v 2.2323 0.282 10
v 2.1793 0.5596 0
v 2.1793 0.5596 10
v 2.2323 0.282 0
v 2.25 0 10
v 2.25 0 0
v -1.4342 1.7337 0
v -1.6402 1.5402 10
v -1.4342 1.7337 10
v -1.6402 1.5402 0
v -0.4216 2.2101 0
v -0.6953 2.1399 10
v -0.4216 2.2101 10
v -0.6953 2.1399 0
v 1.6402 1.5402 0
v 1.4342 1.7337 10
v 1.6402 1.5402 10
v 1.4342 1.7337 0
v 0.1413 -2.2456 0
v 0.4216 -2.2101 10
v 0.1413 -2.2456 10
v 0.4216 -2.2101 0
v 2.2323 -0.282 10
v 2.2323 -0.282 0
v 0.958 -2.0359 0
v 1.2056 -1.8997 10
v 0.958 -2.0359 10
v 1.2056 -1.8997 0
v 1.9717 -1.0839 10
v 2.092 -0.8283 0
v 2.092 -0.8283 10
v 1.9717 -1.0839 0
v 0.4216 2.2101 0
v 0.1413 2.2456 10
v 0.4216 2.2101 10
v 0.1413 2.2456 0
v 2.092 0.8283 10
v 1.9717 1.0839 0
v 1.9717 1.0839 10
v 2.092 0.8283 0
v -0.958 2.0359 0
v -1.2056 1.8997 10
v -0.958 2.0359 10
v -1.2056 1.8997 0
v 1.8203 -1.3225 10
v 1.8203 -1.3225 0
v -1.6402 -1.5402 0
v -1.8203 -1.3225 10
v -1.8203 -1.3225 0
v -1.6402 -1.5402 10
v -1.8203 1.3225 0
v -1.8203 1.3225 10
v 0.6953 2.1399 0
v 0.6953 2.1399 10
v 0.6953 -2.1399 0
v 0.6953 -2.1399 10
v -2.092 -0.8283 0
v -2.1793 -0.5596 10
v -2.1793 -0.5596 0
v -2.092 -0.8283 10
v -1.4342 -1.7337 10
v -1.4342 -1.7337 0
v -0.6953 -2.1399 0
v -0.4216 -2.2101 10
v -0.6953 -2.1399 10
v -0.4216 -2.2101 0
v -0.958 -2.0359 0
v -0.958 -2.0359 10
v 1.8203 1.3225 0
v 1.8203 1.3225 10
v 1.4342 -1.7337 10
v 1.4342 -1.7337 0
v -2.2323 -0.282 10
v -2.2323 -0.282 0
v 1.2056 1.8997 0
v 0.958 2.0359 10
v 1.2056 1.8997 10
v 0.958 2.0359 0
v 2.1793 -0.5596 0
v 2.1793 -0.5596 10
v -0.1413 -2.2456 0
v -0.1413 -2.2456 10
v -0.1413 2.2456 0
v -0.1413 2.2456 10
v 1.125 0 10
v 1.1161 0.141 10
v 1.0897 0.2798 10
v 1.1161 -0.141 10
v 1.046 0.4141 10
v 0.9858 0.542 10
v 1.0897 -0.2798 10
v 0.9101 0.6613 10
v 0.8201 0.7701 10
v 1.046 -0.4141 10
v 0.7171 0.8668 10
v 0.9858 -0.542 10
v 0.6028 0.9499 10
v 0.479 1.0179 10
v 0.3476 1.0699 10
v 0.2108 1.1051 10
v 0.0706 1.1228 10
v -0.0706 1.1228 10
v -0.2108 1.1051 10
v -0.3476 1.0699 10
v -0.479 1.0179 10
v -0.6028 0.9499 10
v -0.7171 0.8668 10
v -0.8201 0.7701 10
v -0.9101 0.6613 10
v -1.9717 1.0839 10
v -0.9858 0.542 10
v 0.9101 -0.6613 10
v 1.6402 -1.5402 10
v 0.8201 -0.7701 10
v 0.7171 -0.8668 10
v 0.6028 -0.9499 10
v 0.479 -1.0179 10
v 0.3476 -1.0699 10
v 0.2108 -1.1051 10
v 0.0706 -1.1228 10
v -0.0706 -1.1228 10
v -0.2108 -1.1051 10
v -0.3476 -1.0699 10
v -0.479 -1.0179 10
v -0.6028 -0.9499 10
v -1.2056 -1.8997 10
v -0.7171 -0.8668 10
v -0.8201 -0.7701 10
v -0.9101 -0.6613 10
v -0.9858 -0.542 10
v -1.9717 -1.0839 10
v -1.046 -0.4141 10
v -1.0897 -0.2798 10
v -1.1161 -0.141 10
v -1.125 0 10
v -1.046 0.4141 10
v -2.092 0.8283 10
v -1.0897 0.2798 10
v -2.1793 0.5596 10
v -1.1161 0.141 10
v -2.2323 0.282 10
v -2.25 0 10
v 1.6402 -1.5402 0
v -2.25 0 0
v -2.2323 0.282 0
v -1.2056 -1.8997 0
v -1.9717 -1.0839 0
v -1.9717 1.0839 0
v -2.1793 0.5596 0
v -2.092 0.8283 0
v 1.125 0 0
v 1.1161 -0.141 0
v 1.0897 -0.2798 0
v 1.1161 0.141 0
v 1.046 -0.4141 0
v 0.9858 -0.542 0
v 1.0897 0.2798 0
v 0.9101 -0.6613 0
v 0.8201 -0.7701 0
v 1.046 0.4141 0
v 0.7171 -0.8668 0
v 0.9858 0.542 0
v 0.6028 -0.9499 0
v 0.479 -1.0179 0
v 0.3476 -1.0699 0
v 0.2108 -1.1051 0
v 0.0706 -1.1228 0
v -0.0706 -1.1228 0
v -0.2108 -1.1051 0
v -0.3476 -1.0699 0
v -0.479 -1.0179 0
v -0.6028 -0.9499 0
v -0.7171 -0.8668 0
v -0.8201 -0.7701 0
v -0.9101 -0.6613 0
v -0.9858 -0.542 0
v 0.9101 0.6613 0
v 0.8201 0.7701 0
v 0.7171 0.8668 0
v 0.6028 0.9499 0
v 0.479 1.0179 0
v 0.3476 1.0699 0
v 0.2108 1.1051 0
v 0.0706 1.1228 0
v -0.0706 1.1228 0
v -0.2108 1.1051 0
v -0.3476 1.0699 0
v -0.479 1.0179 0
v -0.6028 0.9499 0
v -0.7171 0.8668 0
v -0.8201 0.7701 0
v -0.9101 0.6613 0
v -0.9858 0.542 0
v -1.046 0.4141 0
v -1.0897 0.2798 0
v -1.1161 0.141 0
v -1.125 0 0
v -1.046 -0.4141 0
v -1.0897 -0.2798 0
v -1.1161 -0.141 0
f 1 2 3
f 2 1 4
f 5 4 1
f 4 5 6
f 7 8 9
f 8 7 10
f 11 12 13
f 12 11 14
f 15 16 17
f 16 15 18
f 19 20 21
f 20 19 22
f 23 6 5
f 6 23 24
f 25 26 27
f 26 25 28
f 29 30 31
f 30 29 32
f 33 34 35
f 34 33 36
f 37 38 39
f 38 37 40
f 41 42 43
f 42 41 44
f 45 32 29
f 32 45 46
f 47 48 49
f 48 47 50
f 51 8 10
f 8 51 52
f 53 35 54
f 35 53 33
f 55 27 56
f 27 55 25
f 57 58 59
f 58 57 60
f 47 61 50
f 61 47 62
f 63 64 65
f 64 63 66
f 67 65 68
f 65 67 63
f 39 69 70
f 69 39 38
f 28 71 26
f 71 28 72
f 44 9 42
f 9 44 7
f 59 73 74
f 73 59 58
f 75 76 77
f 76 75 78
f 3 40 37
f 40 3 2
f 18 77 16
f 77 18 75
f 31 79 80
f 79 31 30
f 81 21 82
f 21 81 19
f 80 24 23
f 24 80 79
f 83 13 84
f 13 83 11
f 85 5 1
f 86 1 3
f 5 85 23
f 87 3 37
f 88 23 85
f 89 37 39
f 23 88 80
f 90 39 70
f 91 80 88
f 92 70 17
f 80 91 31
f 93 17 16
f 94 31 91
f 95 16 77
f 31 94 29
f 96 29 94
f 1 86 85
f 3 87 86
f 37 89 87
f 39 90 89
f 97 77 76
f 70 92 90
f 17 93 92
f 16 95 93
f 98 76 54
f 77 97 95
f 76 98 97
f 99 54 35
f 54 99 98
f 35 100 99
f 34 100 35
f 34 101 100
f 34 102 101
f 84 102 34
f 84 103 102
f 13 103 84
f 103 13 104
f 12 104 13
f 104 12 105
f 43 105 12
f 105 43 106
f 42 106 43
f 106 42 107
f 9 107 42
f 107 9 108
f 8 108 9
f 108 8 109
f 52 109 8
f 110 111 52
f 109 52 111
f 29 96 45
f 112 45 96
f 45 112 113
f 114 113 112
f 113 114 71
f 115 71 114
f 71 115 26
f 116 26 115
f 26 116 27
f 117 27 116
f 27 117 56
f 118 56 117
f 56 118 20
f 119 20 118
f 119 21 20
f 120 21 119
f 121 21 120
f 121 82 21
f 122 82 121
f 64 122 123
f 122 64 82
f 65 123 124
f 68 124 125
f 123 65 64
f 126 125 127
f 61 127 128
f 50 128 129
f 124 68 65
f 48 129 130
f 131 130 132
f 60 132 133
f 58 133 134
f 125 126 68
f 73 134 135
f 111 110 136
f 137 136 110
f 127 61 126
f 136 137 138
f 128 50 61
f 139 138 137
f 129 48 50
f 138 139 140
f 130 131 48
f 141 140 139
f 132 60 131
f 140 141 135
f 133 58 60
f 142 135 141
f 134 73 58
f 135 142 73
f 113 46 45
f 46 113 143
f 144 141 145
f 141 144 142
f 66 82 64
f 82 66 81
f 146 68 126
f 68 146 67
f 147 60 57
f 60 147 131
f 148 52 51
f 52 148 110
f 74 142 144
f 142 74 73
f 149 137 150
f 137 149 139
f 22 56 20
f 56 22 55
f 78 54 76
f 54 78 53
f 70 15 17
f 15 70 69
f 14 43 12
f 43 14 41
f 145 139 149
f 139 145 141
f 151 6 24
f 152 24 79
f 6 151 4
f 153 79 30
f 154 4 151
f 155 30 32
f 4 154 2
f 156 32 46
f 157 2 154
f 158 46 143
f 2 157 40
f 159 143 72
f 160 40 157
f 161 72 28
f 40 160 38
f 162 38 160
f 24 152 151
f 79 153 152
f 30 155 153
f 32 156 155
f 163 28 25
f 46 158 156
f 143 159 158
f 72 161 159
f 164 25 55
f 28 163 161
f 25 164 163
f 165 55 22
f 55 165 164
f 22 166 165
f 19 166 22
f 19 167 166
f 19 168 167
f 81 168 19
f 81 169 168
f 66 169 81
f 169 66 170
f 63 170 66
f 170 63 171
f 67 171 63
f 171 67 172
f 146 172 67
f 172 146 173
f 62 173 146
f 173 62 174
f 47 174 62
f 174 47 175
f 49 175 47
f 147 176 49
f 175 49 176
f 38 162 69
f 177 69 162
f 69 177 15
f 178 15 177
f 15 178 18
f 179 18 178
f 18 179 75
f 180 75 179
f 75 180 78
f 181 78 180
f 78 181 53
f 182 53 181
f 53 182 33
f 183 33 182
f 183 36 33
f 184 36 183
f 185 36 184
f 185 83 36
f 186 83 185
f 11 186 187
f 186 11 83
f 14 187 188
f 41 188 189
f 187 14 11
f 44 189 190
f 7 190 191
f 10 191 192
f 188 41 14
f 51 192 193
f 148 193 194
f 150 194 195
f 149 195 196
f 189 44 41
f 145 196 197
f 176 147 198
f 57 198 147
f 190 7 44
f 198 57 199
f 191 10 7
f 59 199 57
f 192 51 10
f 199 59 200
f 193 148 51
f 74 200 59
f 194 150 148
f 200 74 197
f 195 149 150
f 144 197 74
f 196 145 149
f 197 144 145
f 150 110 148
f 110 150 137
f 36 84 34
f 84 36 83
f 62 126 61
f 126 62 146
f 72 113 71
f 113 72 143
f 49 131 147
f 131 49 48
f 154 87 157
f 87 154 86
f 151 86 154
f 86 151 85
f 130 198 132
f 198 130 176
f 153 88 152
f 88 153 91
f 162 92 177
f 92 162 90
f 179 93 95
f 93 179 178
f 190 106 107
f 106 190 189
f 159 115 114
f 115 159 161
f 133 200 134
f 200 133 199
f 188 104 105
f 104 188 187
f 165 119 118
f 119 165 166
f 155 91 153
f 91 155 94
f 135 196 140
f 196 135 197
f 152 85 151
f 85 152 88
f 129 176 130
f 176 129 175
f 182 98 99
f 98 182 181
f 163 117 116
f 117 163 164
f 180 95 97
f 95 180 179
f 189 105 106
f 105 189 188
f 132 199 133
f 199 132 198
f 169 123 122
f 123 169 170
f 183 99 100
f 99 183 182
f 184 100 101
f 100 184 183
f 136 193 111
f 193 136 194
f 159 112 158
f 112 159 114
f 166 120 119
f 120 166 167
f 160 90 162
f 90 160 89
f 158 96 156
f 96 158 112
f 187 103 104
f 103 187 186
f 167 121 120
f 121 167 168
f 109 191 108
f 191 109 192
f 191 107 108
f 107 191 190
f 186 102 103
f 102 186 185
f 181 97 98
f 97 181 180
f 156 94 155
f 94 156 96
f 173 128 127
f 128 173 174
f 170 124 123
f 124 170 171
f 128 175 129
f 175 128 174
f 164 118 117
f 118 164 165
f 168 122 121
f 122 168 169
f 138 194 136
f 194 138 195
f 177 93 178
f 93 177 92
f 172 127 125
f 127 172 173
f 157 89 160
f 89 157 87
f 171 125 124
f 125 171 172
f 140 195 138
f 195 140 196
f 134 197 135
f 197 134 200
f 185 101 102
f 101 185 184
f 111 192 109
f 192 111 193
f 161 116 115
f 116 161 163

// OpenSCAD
$fn=50;
$thickness=10;
$drill2=2.25;

difference() {
    translate([0,0,0])cylinder(r=$drill2,h=$thickness);
    translate([0,0,-1])cylinder(r=$drill2/2,h=$thickness+2);
}
